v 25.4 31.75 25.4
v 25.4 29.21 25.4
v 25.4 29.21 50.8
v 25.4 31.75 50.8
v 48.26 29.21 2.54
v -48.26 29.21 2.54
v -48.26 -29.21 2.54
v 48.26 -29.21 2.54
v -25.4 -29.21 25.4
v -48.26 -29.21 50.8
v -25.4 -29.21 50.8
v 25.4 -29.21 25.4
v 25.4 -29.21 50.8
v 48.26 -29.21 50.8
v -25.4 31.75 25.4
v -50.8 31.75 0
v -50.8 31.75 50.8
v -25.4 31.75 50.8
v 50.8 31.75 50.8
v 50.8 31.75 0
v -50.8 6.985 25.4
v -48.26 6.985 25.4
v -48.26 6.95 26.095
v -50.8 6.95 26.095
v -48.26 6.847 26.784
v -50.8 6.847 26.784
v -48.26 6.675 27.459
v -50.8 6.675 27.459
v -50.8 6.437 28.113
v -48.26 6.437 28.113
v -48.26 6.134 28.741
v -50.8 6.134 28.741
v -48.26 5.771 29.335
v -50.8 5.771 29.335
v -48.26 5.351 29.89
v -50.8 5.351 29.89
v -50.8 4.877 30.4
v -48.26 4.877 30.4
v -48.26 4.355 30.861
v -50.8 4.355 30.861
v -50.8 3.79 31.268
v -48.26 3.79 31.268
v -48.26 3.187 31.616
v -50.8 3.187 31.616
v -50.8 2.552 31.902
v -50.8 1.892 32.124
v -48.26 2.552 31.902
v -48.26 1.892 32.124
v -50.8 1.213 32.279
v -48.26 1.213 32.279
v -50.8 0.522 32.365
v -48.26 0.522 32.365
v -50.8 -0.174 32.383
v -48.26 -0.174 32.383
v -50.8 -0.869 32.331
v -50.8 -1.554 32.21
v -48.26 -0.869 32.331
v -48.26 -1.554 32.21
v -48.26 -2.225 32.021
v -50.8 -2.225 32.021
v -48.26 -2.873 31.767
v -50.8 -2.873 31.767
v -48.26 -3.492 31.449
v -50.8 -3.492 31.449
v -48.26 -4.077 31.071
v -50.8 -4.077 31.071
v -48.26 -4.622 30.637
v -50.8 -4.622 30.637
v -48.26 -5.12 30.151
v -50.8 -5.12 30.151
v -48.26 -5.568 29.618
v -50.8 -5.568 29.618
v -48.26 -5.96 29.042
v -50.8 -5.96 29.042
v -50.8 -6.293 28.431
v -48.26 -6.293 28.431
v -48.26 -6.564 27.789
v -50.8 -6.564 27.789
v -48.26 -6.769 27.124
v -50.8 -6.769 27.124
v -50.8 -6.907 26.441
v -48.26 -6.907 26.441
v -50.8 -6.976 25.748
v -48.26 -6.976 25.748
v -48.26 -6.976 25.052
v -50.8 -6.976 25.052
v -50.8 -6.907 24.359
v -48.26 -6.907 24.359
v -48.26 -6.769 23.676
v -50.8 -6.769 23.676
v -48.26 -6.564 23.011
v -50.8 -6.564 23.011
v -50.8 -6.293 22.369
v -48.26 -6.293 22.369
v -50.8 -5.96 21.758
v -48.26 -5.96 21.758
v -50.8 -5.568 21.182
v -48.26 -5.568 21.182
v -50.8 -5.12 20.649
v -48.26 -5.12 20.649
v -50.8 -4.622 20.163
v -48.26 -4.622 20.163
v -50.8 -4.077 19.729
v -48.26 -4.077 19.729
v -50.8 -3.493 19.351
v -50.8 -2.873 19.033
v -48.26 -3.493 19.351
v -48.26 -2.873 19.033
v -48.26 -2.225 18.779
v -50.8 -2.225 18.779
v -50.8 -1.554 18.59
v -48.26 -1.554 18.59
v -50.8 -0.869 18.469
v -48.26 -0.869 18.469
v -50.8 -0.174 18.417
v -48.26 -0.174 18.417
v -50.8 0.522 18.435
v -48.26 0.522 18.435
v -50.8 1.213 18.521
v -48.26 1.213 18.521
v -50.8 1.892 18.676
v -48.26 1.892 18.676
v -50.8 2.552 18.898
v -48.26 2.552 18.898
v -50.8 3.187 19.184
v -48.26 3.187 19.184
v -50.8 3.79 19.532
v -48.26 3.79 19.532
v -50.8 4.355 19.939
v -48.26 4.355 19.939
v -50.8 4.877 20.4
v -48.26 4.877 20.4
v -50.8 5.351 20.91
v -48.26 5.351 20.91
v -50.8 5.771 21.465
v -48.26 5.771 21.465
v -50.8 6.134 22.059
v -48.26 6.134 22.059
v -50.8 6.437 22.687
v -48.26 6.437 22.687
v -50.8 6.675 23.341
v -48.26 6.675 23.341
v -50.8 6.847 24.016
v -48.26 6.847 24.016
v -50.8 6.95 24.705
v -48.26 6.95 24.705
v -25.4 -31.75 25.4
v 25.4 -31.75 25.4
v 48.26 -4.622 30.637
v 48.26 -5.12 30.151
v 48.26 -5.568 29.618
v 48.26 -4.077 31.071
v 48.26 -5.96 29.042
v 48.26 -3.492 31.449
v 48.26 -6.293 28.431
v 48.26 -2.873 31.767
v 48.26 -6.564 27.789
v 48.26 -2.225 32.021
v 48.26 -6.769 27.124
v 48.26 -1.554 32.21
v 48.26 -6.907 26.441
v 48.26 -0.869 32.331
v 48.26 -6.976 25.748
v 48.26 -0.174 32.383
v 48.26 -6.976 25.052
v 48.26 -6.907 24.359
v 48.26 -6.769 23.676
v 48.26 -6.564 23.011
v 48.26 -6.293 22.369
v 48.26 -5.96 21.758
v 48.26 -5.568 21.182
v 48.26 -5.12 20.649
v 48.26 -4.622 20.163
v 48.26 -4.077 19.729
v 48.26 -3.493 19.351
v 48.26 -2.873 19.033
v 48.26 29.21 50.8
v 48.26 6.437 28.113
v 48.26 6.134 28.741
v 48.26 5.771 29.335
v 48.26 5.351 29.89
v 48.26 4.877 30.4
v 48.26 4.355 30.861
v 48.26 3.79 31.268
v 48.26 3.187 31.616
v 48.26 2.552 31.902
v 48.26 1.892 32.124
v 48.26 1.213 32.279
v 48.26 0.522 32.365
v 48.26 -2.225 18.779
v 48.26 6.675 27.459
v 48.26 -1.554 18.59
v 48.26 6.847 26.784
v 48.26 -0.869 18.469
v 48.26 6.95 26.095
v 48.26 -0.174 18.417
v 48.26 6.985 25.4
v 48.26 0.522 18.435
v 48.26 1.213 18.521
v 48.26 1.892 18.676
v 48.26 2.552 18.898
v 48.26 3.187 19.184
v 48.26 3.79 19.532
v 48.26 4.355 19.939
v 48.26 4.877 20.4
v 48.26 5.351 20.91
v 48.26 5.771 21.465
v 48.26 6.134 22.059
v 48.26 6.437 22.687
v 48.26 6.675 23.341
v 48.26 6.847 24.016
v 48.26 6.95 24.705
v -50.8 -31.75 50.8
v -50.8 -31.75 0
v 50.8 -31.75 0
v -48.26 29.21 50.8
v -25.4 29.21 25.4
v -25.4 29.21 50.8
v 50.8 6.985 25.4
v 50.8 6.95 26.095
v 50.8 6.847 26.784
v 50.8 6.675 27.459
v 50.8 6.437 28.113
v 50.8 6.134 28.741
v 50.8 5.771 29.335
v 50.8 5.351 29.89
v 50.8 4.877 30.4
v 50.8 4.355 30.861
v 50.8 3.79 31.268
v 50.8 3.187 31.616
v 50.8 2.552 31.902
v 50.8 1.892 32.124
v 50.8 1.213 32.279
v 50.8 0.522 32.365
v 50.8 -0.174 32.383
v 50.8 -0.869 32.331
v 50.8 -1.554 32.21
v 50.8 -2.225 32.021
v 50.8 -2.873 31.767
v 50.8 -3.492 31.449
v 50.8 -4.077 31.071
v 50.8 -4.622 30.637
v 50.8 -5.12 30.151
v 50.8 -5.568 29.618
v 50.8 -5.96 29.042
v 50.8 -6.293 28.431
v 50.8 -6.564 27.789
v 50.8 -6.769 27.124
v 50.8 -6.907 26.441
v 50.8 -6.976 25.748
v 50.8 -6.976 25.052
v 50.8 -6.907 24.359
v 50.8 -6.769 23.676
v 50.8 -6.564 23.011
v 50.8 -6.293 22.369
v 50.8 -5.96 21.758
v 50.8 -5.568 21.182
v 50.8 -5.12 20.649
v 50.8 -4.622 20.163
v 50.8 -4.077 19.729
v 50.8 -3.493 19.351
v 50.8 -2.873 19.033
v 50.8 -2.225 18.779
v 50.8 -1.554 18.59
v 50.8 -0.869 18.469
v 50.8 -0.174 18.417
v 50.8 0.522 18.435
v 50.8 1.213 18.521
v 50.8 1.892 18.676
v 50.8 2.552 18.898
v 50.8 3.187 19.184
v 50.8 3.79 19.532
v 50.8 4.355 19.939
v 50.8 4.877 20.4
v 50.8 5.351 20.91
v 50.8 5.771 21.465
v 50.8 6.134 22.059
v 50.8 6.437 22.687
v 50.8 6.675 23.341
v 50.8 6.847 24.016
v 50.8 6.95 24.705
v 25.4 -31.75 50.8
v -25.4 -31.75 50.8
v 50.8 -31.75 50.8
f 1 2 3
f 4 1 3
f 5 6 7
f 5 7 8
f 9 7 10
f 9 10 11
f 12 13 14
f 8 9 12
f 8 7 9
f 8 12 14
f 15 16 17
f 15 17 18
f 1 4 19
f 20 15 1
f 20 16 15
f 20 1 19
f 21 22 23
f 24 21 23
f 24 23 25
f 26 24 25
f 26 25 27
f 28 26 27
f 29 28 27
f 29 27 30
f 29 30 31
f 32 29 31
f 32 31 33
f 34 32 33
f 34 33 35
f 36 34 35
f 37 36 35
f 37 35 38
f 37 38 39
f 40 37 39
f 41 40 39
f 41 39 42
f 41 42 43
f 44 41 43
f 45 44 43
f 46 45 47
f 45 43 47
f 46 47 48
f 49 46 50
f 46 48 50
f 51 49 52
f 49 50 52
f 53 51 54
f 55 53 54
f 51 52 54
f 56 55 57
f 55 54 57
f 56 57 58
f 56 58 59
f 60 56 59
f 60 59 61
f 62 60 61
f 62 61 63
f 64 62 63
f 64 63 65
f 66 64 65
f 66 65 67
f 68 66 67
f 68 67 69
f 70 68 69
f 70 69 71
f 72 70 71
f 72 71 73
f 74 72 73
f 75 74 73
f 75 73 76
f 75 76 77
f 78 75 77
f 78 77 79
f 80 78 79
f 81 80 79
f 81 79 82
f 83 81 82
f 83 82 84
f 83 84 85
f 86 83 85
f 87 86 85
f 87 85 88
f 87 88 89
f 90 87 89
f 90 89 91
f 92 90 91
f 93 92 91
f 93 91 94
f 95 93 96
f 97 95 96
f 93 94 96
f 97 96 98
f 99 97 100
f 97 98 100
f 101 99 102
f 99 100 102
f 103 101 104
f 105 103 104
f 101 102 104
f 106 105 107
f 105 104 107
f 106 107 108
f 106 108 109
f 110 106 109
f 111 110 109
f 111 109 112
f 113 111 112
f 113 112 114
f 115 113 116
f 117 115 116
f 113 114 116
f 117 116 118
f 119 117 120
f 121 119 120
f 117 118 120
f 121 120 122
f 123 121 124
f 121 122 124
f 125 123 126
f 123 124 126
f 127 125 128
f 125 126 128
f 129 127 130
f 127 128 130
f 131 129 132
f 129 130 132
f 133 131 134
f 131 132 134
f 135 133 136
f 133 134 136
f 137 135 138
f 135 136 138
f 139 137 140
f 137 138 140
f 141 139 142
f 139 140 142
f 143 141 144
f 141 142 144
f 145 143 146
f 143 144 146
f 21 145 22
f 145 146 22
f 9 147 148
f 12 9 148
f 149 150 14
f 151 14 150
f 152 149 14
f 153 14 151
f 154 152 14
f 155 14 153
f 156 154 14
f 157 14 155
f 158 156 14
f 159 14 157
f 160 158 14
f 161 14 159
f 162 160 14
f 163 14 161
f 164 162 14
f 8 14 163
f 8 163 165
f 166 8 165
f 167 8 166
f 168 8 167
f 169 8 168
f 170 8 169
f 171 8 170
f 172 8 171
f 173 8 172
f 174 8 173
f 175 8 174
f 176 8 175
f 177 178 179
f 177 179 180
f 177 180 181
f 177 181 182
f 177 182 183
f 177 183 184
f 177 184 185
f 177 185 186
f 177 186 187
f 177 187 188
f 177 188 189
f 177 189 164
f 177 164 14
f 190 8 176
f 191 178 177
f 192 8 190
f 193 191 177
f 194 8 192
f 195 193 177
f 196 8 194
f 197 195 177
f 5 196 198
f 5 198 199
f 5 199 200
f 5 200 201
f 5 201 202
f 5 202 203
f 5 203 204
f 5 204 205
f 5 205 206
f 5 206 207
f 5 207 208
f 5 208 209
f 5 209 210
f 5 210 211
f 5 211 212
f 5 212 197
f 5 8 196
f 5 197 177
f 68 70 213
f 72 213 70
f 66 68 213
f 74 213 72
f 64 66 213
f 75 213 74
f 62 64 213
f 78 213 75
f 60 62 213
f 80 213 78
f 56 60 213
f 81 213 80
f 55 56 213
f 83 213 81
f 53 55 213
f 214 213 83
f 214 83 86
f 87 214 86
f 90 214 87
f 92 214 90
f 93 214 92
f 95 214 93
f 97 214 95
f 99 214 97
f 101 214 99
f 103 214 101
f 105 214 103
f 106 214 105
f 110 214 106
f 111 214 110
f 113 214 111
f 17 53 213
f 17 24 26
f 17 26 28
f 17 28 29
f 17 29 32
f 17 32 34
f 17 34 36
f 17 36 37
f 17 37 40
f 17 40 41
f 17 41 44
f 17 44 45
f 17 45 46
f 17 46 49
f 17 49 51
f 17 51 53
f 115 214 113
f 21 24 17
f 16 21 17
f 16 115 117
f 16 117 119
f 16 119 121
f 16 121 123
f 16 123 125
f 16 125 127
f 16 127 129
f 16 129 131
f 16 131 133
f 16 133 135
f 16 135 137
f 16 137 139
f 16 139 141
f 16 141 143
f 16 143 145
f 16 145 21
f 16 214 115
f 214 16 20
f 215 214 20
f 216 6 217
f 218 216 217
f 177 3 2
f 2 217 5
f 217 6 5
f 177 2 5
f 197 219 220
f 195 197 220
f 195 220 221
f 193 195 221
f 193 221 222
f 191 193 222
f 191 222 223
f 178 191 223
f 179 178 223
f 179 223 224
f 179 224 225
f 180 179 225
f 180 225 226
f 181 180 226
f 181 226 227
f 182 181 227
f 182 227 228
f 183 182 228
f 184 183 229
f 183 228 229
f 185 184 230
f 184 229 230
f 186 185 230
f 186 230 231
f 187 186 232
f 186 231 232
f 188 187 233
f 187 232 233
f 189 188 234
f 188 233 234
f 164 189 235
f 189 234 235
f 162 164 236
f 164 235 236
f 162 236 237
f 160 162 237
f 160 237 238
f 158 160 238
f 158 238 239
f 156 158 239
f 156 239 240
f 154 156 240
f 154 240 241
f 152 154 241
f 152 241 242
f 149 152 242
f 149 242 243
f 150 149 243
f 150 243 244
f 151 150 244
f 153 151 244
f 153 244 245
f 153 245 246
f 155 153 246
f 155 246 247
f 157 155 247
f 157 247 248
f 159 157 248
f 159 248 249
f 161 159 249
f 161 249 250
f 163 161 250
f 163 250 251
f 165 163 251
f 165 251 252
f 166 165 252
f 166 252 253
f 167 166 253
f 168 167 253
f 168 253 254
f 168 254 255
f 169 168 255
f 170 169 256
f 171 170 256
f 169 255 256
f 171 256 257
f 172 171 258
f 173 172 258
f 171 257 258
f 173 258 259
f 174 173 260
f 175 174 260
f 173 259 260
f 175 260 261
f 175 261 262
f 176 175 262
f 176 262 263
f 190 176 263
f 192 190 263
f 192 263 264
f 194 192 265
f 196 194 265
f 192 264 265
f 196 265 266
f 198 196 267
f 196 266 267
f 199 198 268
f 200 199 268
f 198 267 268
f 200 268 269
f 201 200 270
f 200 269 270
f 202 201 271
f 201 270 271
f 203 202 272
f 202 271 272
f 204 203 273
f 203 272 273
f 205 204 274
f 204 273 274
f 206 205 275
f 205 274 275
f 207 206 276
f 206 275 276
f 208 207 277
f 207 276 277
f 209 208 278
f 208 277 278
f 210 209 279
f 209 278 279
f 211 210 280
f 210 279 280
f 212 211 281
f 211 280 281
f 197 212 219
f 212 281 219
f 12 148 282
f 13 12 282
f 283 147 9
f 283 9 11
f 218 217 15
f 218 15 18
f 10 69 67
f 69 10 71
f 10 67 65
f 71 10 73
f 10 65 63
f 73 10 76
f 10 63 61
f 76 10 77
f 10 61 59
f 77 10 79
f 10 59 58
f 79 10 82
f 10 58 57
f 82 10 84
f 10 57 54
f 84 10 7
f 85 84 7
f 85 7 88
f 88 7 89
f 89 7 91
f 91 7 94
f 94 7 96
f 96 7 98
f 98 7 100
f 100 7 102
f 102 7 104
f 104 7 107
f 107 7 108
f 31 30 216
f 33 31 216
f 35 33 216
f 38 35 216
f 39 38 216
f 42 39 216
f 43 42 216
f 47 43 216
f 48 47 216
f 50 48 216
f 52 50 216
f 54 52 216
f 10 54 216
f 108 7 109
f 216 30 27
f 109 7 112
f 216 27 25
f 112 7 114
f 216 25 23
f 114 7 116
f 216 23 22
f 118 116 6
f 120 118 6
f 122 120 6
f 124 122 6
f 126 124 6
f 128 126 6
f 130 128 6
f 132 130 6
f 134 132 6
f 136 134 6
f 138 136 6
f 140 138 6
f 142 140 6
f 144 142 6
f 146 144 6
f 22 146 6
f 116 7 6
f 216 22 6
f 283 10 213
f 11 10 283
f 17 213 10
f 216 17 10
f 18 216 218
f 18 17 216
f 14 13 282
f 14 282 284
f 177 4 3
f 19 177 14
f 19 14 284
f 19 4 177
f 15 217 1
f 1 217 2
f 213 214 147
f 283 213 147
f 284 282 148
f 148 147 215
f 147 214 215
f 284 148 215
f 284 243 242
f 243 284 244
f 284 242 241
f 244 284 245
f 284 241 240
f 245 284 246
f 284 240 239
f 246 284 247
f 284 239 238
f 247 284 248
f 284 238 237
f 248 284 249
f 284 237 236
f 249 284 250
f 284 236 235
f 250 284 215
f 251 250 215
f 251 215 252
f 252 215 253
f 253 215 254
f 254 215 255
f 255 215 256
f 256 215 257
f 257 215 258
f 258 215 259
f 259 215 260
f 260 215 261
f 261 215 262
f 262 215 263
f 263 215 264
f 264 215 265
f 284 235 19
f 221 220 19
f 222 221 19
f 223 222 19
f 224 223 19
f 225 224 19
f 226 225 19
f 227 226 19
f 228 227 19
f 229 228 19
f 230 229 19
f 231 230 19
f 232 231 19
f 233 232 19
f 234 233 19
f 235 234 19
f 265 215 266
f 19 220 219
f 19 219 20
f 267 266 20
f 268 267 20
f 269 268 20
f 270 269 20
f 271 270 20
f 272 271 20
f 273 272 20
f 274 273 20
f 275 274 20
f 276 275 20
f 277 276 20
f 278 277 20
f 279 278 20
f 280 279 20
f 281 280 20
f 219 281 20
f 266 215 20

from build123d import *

# Parameters (mm, degrees)
F0_W     = 101.6
F0_H     = 63.5
F1_DEPTH = 50.8
F2_T     = -2.54
F3_R     = 6.985
F4_DEPTH = 101.601
F5_W     = 50.8
F5_H     = 25.4
F6_DEPTH = 63.501


with BuildPart() as f1:
    # F0 (on Top) → F1 (new body)
    with BuildSketch(Plane.XY):
        Rectangle(F0_W, F0_H)
    extrude(amount=F1_DEPTH)

    # F2
    f2_openings = [f1.faces().sort_by_distance(p)[0] for p in [
        (0, 0, 50.8),
    ]]
    offset(amount=F2_T, openings=f2_openings)

    # F3 (on face) → F4 (cut, through all)
    with BuildSketch(Plane.YZ.offset(50.8)):
        with Locations((0, 25.4)):
            Circle(F3_R)
    extrude(amount=-F4_DEPTH, mode=Mode.SUBTRACT)

    # F5 (on face) → F6 (cut, through all)
    with BuildSketch(Plane.XZ.offset(31.75)):
        with Locations((0, 38.1)):
            Rectangle(F5_W, F5_H)
    extrude(amount=-F6_DEPTH, mode=Mode.SUBTRACT)


solid = f1.part
